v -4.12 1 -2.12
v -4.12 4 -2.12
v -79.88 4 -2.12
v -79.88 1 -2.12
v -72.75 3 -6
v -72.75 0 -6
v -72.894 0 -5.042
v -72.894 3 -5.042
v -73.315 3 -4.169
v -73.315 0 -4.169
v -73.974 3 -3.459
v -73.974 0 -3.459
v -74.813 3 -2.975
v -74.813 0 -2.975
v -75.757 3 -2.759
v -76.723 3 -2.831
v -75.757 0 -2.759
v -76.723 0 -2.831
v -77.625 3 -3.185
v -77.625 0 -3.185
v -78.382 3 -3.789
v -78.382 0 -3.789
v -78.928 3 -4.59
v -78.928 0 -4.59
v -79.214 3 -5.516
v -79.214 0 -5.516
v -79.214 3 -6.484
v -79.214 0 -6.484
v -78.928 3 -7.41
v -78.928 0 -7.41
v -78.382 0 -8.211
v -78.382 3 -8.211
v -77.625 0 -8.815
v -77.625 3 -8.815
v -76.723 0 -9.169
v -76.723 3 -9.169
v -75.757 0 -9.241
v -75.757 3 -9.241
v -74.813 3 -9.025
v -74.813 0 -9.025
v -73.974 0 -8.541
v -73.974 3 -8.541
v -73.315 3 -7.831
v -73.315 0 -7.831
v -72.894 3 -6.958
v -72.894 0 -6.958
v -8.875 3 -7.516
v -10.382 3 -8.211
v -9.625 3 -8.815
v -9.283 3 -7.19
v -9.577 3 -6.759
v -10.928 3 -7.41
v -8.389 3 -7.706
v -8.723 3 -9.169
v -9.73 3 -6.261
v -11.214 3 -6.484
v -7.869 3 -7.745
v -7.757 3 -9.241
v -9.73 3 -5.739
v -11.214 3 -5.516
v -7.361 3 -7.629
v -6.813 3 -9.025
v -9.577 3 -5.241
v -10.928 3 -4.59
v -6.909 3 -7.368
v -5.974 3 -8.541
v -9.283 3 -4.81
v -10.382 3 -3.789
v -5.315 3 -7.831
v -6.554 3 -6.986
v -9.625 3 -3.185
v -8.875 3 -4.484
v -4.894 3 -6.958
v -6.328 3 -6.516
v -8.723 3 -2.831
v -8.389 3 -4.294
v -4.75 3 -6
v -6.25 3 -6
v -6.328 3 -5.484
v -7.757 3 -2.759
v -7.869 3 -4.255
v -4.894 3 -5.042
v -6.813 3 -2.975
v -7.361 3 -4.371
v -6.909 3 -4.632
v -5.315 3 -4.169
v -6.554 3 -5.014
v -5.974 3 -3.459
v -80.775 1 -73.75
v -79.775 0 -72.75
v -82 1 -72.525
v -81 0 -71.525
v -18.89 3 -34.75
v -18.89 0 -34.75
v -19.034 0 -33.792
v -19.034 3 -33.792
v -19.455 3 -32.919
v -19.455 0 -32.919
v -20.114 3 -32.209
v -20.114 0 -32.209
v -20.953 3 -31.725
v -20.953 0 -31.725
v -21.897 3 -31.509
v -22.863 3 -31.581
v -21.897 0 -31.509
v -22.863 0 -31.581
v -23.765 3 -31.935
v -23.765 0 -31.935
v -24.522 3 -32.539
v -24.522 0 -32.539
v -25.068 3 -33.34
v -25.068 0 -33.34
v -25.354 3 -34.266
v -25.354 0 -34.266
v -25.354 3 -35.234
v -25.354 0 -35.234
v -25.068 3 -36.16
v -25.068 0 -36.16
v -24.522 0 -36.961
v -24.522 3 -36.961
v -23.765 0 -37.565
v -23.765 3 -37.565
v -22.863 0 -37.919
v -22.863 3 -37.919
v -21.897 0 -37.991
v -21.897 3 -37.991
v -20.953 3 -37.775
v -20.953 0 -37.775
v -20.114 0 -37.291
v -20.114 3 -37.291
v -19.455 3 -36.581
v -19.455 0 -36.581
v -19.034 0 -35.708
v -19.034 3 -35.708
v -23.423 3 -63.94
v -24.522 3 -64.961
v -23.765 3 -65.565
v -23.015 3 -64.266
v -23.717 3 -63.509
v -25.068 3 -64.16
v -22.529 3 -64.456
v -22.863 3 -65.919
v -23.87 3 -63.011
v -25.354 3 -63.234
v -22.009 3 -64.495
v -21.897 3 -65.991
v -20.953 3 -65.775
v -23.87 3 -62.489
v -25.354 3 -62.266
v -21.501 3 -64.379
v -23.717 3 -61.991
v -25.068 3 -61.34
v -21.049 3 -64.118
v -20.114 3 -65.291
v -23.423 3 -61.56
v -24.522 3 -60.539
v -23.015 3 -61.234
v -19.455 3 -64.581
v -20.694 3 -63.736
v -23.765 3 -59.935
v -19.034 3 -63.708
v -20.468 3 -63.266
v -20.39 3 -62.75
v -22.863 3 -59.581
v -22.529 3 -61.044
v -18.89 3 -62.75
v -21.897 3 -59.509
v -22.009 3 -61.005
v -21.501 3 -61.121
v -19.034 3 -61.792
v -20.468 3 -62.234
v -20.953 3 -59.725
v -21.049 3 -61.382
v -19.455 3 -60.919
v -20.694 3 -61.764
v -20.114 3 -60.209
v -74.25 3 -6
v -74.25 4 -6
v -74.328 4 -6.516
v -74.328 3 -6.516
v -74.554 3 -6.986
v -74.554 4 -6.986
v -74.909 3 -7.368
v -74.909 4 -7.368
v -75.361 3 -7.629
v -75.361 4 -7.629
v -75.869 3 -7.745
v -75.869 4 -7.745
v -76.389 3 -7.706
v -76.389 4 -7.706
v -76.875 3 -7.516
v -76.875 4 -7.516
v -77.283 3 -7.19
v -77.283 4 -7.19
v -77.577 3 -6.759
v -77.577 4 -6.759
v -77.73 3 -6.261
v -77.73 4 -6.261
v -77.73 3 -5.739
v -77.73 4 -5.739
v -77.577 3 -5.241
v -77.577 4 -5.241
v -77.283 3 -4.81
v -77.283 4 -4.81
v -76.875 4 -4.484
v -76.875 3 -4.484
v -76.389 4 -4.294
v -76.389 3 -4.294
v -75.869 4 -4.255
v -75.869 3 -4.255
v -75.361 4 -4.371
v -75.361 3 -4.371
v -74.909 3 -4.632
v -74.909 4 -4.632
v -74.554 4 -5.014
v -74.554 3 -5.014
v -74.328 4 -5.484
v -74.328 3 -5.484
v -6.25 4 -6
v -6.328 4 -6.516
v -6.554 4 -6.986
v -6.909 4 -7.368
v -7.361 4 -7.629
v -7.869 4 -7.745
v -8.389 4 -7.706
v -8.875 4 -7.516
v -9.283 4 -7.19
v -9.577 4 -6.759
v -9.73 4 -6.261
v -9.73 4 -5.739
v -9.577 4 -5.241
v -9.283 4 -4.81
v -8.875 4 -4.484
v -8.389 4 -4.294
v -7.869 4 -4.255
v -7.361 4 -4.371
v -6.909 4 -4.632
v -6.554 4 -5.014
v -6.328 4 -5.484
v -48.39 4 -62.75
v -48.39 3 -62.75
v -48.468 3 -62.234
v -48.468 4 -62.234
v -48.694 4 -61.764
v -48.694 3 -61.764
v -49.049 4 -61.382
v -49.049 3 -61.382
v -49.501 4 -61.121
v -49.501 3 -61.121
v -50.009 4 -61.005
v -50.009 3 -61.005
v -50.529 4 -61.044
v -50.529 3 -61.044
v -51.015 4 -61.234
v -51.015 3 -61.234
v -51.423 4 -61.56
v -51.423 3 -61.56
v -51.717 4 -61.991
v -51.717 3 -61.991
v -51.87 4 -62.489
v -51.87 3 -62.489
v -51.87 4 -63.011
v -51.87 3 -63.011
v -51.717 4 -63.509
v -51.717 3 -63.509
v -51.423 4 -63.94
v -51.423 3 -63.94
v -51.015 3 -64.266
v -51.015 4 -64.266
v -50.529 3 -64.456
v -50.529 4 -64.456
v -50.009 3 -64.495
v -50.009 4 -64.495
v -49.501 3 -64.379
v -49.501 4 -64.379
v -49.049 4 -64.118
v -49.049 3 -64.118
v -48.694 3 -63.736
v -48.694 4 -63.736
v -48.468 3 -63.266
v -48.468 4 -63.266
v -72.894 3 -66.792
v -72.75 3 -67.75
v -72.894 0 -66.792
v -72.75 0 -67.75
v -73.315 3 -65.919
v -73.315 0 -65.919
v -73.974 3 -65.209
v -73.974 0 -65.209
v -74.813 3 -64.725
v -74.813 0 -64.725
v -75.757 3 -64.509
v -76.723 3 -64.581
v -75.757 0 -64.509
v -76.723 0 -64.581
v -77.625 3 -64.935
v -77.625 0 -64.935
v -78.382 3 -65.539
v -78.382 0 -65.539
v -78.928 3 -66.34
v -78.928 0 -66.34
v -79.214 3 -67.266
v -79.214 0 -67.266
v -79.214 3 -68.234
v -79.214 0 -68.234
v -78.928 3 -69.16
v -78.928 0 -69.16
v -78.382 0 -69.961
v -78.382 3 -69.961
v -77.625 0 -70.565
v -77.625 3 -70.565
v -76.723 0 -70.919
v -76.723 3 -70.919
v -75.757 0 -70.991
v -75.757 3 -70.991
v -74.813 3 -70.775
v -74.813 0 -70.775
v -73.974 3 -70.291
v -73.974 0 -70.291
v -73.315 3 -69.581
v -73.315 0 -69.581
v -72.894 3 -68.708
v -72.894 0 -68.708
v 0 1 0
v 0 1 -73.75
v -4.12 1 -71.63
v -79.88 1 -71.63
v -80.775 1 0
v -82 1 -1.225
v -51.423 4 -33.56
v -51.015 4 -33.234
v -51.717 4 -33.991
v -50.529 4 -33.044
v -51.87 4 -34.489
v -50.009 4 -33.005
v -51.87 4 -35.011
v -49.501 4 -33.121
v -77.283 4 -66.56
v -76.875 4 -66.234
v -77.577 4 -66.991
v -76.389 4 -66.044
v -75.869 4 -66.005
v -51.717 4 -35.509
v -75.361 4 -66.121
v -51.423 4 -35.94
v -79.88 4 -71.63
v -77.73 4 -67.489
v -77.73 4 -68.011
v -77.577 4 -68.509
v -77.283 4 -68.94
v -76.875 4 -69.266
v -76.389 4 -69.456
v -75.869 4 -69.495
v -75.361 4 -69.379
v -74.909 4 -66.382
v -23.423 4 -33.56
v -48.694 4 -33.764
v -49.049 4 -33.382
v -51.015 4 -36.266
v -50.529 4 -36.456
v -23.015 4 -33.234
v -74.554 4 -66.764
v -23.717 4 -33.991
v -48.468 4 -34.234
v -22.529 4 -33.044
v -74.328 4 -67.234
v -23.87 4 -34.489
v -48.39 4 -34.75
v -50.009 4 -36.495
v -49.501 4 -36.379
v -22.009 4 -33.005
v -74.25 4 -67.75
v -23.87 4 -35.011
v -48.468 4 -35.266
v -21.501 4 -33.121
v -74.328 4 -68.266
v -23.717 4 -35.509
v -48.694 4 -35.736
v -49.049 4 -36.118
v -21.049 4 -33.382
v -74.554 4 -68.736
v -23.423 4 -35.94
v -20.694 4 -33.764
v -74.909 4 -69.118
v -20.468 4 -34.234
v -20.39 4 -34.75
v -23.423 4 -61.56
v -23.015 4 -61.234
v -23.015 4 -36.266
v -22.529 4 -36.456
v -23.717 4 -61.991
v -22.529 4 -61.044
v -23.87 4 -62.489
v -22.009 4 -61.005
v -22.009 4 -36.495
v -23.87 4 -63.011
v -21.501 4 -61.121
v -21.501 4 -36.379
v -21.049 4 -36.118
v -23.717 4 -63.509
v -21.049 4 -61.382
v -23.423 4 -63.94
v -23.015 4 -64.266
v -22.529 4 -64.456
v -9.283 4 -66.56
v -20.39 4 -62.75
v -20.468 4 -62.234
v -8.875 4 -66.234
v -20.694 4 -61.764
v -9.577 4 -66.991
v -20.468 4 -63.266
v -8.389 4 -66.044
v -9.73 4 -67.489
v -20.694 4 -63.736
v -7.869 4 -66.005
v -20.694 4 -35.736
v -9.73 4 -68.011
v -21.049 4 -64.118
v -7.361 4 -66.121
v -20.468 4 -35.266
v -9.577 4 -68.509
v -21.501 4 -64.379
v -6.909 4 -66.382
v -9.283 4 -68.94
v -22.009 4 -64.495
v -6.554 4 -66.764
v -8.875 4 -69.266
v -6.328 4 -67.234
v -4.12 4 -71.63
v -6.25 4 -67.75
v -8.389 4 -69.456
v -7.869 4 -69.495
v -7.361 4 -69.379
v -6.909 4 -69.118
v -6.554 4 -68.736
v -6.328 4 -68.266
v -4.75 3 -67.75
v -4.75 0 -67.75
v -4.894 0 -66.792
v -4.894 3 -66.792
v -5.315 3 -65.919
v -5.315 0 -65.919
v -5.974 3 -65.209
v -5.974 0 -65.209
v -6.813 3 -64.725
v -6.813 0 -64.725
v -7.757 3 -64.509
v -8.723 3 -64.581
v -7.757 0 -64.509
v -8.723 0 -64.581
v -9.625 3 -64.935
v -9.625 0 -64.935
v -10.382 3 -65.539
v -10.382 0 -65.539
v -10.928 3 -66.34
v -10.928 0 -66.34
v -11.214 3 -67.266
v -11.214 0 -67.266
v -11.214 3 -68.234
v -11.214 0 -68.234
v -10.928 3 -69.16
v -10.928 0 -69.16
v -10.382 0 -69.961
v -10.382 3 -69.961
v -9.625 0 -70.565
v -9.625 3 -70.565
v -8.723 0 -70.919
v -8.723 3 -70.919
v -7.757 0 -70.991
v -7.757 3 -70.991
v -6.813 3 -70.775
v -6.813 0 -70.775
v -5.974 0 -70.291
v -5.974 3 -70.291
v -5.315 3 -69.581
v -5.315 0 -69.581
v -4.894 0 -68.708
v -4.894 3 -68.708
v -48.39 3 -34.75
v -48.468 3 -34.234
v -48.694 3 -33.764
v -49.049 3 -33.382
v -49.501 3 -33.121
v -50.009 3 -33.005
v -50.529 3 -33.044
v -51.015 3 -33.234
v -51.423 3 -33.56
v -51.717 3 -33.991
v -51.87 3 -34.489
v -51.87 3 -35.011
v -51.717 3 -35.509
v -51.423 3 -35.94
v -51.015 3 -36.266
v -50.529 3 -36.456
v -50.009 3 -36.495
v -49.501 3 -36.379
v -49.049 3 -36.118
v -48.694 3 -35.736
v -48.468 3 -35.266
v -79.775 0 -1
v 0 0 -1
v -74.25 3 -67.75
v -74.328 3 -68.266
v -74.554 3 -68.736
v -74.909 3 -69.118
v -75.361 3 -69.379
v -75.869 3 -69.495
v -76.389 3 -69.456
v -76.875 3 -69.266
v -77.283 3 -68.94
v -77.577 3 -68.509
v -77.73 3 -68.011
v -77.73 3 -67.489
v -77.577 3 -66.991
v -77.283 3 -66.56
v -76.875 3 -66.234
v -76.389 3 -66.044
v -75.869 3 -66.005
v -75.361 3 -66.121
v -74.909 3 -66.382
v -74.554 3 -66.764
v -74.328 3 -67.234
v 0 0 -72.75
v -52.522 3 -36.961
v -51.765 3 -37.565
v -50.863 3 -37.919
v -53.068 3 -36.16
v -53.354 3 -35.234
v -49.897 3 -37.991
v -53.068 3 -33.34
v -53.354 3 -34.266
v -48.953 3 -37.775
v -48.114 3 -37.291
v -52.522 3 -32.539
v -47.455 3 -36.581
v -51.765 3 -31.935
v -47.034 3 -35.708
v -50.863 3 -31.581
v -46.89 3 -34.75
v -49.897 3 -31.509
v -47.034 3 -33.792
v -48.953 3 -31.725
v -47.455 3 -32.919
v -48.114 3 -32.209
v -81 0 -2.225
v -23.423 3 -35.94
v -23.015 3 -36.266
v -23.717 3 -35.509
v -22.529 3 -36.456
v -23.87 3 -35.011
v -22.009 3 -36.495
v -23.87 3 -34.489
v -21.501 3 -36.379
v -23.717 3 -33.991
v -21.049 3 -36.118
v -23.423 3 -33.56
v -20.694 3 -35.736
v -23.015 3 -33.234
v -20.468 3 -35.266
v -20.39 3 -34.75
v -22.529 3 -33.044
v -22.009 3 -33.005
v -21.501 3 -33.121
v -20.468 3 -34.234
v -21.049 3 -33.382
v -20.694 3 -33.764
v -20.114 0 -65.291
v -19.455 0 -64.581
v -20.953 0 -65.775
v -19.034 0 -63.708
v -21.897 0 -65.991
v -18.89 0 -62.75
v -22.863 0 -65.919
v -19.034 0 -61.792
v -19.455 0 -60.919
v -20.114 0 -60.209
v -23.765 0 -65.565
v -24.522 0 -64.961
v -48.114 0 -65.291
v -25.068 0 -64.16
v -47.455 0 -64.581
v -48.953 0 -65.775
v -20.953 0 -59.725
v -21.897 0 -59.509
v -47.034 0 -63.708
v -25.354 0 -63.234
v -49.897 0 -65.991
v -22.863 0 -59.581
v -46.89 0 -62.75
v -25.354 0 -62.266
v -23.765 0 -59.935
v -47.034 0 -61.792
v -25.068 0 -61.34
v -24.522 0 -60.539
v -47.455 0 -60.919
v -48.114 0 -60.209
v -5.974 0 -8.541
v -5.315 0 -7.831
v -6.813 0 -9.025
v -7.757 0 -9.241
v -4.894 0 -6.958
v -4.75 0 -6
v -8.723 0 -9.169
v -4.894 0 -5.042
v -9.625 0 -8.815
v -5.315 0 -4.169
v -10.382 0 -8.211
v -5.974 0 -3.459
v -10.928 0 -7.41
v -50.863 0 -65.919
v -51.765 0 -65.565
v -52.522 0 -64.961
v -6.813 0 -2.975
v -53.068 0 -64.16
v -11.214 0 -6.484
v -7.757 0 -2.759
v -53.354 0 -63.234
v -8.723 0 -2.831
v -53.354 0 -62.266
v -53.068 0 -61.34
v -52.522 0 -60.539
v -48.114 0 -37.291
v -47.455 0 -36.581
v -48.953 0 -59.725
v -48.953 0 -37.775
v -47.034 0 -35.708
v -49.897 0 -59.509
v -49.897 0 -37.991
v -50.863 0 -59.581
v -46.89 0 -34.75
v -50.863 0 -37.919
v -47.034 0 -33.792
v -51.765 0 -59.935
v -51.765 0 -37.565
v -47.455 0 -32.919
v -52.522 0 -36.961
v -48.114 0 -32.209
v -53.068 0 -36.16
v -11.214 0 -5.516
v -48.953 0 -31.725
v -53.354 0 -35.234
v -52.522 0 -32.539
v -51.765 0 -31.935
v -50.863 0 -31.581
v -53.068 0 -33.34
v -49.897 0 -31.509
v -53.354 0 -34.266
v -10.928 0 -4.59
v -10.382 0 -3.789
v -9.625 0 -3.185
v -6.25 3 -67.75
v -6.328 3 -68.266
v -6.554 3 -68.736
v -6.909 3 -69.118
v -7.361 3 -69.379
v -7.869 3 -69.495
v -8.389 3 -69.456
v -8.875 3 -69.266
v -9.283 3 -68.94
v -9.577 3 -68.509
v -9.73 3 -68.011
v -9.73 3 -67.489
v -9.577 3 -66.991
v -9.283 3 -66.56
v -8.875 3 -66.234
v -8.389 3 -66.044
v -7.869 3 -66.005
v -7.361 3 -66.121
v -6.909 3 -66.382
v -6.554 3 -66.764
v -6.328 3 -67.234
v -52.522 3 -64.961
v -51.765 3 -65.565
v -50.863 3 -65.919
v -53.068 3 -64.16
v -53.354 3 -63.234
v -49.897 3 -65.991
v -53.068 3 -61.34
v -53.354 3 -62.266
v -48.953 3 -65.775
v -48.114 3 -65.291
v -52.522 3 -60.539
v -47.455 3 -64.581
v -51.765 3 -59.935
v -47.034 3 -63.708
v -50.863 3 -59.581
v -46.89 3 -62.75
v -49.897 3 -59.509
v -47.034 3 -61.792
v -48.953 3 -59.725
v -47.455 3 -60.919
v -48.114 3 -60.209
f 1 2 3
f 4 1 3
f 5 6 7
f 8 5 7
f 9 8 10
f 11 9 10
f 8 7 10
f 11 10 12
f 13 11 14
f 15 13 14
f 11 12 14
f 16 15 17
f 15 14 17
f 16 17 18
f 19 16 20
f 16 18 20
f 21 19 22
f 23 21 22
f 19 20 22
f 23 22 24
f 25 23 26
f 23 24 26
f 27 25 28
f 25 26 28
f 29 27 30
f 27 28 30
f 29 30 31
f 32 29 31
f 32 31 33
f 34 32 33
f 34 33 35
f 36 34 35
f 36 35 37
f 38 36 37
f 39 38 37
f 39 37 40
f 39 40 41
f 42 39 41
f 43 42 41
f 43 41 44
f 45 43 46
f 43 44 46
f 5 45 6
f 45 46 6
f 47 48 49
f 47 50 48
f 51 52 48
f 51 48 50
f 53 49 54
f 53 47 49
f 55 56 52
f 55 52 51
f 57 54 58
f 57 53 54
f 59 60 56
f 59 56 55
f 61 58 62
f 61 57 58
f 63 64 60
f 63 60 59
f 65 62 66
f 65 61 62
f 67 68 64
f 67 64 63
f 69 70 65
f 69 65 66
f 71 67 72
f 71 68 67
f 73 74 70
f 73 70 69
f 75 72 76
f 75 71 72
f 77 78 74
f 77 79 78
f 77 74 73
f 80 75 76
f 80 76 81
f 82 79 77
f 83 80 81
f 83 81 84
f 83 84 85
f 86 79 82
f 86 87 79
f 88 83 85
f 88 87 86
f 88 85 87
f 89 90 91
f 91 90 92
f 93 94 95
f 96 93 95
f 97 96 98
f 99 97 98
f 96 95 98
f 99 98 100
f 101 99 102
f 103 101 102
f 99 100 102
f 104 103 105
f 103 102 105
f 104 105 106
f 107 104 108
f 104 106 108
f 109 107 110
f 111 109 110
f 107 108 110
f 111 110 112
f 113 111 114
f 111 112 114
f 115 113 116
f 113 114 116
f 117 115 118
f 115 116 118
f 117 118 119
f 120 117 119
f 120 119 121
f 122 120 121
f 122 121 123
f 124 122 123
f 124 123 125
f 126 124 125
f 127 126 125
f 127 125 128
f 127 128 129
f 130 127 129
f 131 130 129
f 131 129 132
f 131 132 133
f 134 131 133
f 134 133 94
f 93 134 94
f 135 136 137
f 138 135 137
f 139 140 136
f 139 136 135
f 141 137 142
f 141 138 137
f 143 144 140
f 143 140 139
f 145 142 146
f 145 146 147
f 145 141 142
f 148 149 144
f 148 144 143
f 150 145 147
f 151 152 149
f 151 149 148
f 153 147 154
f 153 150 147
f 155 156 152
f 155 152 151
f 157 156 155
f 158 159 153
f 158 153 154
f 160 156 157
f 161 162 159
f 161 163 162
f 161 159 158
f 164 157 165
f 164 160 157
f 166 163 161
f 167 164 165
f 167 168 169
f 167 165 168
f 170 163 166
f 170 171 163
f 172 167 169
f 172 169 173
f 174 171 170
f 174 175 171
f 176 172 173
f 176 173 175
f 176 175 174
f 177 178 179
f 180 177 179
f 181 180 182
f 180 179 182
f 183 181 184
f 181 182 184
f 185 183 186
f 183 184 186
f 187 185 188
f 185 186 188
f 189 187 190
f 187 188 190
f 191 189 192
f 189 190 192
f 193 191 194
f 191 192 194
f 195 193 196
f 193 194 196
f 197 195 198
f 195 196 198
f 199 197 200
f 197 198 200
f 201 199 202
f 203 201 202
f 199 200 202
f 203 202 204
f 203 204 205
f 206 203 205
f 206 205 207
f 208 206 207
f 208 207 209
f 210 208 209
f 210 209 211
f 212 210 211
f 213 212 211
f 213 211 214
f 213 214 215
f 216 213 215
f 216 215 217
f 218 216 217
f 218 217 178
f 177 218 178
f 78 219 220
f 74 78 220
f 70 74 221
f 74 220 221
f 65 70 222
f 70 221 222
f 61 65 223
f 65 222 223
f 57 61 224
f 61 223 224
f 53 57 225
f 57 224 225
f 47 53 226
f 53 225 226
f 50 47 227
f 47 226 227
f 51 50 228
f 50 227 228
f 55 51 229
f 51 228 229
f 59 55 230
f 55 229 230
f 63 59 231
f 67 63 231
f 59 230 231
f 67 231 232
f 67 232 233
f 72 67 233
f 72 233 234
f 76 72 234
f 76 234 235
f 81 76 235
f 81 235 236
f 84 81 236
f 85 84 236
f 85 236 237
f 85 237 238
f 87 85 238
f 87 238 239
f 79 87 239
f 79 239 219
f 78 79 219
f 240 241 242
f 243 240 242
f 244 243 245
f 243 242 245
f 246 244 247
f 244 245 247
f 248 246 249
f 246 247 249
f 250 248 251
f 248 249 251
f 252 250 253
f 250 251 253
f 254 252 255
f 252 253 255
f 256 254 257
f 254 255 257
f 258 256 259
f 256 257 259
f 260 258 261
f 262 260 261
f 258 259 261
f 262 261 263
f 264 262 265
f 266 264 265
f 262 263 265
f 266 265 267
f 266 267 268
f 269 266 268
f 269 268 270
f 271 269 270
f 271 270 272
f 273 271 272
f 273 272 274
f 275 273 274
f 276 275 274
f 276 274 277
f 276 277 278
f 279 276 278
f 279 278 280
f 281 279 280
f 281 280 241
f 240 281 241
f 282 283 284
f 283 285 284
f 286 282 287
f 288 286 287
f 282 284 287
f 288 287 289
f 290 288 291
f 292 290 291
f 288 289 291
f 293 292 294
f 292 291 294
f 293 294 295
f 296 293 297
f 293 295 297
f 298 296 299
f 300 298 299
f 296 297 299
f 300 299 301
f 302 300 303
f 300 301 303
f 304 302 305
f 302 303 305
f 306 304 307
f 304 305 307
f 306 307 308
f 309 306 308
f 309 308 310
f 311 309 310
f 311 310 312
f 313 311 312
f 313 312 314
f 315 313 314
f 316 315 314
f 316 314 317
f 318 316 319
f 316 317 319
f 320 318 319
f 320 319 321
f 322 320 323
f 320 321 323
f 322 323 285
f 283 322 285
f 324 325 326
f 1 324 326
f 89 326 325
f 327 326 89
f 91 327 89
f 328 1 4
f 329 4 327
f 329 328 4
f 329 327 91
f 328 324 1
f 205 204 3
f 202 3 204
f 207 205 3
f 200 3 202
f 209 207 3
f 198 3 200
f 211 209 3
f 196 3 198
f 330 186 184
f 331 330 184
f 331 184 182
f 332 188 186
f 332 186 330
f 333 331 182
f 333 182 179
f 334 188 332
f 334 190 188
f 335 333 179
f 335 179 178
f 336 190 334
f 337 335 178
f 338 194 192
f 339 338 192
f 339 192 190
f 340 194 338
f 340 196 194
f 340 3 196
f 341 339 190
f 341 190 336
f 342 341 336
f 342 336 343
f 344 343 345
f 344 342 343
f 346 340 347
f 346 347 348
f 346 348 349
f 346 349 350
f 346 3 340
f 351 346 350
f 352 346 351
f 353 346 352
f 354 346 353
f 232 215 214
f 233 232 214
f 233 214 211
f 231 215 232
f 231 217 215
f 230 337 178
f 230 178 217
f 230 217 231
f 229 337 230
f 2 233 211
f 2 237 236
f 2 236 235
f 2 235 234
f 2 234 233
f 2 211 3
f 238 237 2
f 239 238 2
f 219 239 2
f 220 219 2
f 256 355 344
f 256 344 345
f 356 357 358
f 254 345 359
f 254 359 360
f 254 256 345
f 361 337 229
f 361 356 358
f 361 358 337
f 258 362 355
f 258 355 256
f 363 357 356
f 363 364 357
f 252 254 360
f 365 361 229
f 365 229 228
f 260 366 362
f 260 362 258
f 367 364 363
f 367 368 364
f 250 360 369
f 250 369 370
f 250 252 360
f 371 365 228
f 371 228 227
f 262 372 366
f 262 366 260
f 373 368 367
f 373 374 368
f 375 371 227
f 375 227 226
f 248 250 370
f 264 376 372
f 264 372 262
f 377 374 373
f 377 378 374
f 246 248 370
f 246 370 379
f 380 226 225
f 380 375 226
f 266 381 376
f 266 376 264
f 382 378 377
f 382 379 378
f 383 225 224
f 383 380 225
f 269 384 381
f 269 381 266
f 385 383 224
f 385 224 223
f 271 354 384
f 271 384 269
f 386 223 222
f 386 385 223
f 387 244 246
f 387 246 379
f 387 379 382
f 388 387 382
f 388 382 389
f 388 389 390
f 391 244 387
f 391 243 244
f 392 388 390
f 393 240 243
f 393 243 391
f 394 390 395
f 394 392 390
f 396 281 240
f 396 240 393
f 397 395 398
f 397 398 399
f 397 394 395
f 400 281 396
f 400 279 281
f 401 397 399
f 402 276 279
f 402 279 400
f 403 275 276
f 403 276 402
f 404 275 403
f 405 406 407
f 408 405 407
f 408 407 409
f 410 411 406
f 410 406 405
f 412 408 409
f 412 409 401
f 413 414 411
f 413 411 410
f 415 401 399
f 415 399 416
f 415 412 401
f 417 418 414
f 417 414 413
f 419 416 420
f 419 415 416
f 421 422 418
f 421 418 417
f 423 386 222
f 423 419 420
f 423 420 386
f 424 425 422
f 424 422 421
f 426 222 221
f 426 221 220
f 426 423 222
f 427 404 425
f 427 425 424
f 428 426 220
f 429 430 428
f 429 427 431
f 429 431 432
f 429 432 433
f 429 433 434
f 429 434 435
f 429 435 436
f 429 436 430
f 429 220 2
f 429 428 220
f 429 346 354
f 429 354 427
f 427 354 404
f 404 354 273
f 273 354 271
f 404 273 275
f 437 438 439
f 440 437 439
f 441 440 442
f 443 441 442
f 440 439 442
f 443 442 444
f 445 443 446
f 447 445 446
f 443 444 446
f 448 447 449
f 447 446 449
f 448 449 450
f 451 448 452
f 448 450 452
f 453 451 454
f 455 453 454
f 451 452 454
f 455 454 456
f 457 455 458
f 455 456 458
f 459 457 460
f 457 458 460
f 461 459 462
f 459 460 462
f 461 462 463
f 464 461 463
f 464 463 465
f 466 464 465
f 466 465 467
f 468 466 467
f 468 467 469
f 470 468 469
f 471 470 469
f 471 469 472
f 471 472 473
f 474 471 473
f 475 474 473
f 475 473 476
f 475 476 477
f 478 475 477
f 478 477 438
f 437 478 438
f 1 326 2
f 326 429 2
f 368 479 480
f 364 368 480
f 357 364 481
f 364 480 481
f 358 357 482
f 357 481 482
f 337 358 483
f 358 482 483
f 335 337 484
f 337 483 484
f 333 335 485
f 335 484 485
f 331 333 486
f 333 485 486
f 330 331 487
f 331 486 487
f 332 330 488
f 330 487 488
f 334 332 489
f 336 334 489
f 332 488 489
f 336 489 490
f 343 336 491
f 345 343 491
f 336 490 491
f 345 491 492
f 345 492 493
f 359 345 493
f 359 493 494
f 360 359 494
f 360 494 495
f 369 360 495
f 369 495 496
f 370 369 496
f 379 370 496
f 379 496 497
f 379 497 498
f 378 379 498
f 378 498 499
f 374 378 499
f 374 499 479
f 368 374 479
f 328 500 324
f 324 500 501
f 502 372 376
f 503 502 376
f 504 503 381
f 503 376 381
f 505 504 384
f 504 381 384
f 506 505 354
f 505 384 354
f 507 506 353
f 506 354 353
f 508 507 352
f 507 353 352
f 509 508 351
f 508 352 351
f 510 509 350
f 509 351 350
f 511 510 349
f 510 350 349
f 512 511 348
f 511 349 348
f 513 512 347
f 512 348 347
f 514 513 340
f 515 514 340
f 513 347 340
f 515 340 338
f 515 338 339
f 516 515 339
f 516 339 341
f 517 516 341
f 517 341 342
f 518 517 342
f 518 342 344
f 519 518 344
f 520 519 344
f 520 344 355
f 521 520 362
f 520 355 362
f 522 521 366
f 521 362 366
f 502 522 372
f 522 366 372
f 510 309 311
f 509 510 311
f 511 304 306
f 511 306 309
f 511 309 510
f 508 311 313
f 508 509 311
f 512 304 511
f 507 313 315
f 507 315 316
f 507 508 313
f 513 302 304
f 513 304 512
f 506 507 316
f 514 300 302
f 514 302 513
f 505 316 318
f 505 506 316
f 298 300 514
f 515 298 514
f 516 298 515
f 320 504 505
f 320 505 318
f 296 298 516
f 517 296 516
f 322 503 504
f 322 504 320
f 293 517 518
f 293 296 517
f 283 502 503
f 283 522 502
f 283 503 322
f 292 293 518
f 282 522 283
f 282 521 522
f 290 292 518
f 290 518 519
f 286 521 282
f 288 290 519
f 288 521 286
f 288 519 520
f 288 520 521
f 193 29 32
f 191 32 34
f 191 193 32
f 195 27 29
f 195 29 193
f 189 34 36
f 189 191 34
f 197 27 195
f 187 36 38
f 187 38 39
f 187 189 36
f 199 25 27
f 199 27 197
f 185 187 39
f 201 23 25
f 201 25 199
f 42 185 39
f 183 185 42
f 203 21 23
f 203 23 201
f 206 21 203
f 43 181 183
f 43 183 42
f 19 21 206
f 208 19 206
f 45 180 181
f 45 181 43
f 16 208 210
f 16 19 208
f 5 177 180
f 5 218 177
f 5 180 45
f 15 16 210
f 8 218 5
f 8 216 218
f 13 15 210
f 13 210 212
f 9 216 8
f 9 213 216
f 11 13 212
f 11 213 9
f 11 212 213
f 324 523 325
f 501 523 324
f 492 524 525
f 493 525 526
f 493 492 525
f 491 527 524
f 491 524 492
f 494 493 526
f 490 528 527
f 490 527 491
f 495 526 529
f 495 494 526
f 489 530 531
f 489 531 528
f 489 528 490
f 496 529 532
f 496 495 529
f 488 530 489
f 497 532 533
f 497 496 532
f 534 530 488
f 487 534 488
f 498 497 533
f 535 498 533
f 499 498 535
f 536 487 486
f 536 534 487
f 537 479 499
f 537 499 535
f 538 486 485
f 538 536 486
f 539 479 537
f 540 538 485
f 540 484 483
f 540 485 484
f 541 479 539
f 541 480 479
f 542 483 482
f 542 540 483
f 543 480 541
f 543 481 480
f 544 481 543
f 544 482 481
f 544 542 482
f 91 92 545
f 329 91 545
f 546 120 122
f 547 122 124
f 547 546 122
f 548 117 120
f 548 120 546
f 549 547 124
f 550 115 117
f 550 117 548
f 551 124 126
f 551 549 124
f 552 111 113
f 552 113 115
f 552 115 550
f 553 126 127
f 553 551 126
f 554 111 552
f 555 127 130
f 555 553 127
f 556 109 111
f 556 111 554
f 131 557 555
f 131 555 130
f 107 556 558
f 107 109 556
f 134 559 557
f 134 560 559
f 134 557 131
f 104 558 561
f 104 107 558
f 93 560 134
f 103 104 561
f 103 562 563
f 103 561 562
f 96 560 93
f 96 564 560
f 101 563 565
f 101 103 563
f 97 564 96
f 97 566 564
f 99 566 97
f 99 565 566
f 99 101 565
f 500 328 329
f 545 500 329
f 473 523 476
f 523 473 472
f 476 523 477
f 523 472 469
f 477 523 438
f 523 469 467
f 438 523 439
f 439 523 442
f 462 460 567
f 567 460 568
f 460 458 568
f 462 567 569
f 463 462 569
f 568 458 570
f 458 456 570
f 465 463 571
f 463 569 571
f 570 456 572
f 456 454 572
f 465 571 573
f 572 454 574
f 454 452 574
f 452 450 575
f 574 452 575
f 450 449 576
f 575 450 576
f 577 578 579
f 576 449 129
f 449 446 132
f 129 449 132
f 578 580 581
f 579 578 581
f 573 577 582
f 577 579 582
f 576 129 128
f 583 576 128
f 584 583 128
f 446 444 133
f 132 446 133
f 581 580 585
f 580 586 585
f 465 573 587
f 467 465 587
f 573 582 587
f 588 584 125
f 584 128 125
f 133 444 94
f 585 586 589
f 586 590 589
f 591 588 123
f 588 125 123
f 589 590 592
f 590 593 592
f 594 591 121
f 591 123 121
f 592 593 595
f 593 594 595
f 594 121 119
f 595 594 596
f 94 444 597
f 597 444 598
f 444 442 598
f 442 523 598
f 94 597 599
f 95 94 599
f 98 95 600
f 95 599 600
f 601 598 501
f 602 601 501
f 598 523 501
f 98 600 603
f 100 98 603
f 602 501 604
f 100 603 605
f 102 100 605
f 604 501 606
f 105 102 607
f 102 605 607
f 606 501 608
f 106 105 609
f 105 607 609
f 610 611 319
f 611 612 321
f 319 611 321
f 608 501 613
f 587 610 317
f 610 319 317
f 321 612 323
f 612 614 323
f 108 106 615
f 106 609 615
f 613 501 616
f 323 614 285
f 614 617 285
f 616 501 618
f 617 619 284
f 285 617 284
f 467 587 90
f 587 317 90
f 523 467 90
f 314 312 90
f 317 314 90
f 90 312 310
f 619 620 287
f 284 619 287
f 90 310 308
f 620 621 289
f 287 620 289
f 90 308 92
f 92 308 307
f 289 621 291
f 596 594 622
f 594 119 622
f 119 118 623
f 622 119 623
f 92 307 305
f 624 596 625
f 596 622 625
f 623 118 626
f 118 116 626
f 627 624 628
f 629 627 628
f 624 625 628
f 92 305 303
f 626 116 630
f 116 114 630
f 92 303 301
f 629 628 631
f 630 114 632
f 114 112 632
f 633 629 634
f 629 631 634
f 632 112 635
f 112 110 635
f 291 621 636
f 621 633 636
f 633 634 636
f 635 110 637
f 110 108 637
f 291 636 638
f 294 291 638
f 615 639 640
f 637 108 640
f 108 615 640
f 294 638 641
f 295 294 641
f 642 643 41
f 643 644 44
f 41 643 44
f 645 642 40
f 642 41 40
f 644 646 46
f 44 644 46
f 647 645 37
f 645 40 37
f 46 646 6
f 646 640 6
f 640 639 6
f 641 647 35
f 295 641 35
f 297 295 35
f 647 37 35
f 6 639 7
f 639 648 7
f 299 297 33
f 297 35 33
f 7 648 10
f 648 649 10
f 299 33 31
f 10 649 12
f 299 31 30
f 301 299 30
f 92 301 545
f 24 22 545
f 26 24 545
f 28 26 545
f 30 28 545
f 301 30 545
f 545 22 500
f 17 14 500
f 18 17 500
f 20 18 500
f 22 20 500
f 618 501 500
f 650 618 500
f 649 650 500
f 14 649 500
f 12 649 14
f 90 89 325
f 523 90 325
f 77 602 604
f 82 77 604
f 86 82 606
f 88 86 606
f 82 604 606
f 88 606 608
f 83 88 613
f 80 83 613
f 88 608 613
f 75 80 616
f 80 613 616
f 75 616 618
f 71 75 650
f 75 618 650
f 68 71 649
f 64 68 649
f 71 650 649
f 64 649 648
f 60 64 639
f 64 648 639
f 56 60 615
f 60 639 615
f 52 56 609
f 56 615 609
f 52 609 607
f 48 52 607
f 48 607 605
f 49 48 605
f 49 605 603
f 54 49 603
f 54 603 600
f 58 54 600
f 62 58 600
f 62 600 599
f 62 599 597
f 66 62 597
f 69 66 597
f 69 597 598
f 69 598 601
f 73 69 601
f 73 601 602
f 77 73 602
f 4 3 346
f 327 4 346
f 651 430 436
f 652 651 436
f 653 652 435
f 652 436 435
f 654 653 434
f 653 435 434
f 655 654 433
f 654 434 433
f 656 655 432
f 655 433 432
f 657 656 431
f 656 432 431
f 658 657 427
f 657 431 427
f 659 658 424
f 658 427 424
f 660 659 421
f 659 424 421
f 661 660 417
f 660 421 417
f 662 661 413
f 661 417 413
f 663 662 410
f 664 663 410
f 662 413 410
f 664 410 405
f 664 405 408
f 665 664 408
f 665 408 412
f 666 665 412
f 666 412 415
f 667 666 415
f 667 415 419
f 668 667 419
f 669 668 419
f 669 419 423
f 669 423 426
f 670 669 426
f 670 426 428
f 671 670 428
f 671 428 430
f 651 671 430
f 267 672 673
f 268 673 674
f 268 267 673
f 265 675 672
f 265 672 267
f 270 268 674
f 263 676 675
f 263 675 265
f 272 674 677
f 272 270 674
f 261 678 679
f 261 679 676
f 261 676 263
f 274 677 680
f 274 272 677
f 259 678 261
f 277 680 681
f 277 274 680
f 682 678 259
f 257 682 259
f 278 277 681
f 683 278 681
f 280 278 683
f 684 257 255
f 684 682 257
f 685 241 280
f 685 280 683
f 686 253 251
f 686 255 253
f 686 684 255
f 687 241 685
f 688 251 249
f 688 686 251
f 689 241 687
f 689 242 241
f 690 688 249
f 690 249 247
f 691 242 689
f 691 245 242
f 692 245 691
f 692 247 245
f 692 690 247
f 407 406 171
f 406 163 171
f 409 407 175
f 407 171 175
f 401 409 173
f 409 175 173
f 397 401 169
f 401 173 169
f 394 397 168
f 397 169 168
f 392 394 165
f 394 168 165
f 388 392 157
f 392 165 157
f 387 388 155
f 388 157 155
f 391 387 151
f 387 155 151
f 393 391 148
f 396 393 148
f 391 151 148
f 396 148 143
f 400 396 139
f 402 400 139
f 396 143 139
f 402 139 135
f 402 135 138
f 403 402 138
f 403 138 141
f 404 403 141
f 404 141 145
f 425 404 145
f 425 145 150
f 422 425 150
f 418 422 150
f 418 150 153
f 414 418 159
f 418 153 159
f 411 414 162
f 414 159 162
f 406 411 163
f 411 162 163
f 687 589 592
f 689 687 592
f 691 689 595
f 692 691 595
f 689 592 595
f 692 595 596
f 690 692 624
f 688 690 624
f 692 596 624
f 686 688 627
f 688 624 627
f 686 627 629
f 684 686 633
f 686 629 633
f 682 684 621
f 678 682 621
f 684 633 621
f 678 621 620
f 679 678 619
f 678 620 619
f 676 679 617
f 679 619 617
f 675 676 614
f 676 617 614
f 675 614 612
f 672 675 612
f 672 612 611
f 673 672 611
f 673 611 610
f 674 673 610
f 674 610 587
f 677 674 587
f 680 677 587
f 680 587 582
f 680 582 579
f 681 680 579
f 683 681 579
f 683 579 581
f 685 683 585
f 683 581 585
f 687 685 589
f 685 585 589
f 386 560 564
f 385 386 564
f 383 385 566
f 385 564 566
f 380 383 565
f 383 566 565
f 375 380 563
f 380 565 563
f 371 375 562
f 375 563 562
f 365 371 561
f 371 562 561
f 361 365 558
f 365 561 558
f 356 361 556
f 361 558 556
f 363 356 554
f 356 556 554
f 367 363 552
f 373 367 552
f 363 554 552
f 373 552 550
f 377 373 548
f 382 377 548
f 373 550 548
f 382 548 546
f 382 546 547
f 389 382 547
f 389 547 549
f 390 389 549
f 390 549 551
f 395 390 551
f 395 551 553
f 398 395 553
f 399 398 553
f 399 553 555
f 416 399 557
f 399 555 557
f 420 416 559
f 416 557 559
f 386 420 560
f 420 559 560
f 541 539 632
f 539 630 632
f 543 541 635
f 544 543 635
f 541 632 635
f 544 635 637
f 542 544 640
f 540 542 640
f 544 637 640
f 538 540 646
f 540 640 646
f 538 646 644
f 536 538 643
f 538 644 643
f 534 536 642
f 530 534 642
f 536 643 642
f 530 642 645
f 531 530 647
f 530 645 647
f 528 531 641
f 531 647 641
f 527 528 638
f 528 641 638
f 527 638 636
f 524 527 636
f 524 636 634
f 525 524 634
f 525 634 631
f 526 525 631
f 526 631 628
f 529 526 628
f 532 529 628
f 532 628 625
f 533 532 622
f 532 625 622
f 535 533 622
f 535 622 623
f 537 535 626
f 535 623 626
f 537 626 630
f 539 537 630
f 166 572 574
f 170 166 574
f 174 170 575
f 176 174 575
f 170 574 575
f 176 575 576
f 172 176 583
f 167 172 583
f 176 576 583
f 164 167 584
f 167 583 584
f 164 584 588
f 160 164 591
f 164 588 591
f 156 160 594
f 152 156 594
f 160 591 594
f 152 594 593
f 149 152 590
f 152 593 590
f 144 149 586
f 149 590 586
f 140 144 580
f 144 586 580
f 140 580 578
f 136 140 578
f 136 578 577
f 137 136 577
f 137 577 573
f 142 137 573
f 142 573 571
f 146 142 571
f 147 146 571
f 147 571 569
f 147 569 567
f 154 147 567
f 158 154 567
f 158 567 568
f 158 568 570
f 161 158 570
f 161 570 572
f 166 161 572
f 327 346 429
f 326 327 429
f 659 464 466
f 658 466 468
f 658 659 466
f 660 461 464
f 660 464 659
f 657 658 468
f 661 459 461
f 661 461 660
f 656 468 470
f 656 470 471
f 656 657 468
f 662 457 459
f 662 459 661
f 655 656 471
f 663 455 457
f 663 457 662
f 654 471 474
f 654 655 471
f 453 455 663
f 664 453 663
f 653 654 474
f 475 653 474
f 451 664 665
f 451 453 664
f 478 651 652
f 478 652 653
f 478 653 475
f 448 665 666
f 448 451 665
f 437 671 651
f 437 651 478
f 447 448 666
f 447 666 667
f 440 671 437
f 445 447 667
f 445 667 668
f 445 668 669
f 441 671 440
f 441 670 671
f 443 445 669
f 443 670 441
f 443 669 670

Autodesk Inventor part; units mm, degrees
ref_plane "YZ Plane" through (0, 0, 0) normal (1, 0, 0) x (0, 1, 0)
ref_plane "XZ Plane" through (0, 0, 0) normal (0, 1, 0) x (-1, 0, 0)
ref_plane "XY Plane" through (0, 0, 0) normal (0, 0, 1) x (1, 0, 0)
sketch "Sketch1" plane through (0, 0, 0) normal (0, 1, 0) x (-1, 0, 0)
  line L0 (0, 0) -> (82, 0)
  line L1 (82, 0) -> (82, -73.75)
  line L2 (82, -73.75) -> (0, -73.75)
  line L3 (0, -73.75) -> (0, 0)
  dimension "d0" = 82
  dimension "d1" = 73.75
extrude "Extrusion1" add sketch "Sketch1" along normal blind 1
sketch "Sketch2" plane through (0, 1, 0) normal (0, 1, 0) x (1, 0, 0)
  line L0 (-82, 0) -> (0, 0) projected
  line L1 (0, 0) -> (-4, 0)
  line L2 (-4, 0) -> (-4, 2)
  line L3 (-4, 2) -> (0, 2)
  line L4 (0, 2) -> (0, 0)
  line L5 (0, 73.75) -> (-82, 73.75) projected
  line L6 (0, 73.75) -> (-4, 73.75)
  line L7 (-4, 73.75) -> (-4, 71.75)
  line L8 (-4, 71.75) -> (0, 71.75)
  line L9 (0, 71.75) -> (0, 73.75)
  line L10 (0, 73.75) -> (-82, 73.75)
  line L11 (-82, 0) -> (-80, 0)
  line L12 (-80, 0) -> (-80, 2)
  line L13 (-80, 2) -> (-82, 2)
  line L14 (-82, 2) -> (-82, 0)
  line L15 (-82, 73.75) -> (-82, 0) projected
  line L16 (-82, 73.75) -> (-80, 73.75)
  line L17 (-80, 73.75) -> (-80, 71.75)
  line L18 (-80, 71.75) -> (-82, 71.75)
  line L19 (-82, 71.75) -> (-82, 73.75)
  line L20 (-4, 2) -> (-80, 2)
  line L21 (-80, 2) -> (-80, 71.75)
  line L22 (-80, 71.75) -> (-4, 71.75)
  line L23 (-4, 71.75) -> (-4, 2)
  dimension "d4" = 4
  dimension "d5" = 2
  dimension "d6" = 4
  dimension "d7" = 2
  dimension "d8" = 2
  dimension "d9" = 2
  dimension "d10" = 2
  dimension "d11" = 2
extrude "Extrusion2" add sketch "Sketch2" along normal blind 3 contours L21 L22 L23 L20
sketch "Sketch3" plane through (0, 0, 0) normal (0, -1, 0) x (1, 0, 0)
  line L0 (-82, -73.75) -> (-82, 0) projected
  line L1 (-82, -73.75) -> (-50.14, -73.75)
  line L2 (-50.14, -73.75) -> (-50.14, -62.75)
  line L3 (-50.14, -62.75) -> (-82, -62.75)
  line L4 (-82, -62.75) -> (-82, -73.75)
  line L5 (-50.14, -62.75) -> (-22.14, -62.75)
  line L6 (-22.14, -62.75) -> (-22.14, -34.75)
  line L7 (-22.14, -34.75) -> (-50.14, -34.75)
  line L8 (-50.14, -34.75) -> (-50.14, -62.75)
  circle A0 centre (-22.14, -62.75) radius 1.75
  circle A1 centre (-22.14, -34.75) radius 1.75
  circle A2 centre (-50.14, -34.75) radius 1.75
  circle A3 centre (-50.14, -62.75) radius 1.75
  point P0 (0, 0)
  point P1 (-48.39, -62.75)
  point P2 (-50.14, -61)
  point P3 (-51.89, -62.75)
  point P4 (-50.14, -64.5)
  point P5 (-23.89, -62.75)
  point P6 (-22.14, -61)
  point P7 (-22.14, -36.5)
  point P8 (-23.89, -34.75)
  point P9 (-48.39, -34.75)
  point P10 (-50.14, -36.5)
  dimension "d14" = 31.86
  dimension "d15" = 11
  dimension "d16" = 28
  dimension "d17" = 28
  dimension "d18" = 3.5
  dimension "d19" = 3.5
  dimension "d20" = 3.5
  dimension "d21" = 3.5
extrude "Extrusion3" cut sketch "Sketch3" against normal blind 5 contours A3 L8 L3 | L3 L2 A3 | L2 L5 A3 | L8 A3 L5 | A2 L7 L8 | L8 L7 A2 | A0 L6 L5 | L5 L6 A0 | A1 L6 L7 | L7 L6 A1
sketch "Sketch4" plane through (0, 0, 0) normal (0, -1, 0) x (1, 0, 0)
  circle A0 centre (-22.14, -62.75) radius 1.75 projected
  circle A1 centre (-22.14, -62.75) radius 3.25
  circle A2 centre (-50.14, -62.75) radius 1.75 projected
  circle A3 centre (-50.14, -62.75) radius 3.25
  circle A4 centre (-50.14, -34.75) radius 1.75 projected
  circle A5 centre (-50.14, -34.75) radius 3.25
  circle A6 centre (-22.14, -34.75) radius 1.75 projected
  circle A7 centre (-22.14, -34.75) radius 3.25
  point P0 (0, 0)
  dimension "d24" = 6.5
  dimension "d25" = 6.5
  dimension "d26" = 6.5
  dimension "d27" = 6.5
extrude "Extrusion4" cut sketch "Sketch4" against normal blind 3
sketch "Sketch5" plane through (0, 4, 0) normal (0, 1, 0) x (1, 0, 0)
  line L0 (-4, 71.75) -> (-80, 71.75) projected
  line L1 (-80, 71.75) -> (-76, 71.75)
  line L2 (-80, 71.75) -> (-76, 71.75)
  line L3 (-76, 71.75) -> (-76, 67.75)
  line L4 (-76, 67.75) -> (-80, 67.75)
  line L5 (-80, 67.75) -> (-80, 71.75)
  line L6 (-4, 71.75) -> (-8, 71.75)
  line L7 (-8, 71.75) -> (-8, 67.75)
  line L8 (-8, 67.75) -> (-4, 67.75)
  line L9 (-4, 67.75) -> (-4, 71.75)
  line L10 (-80, 2) -> (-4, 2) projected
  line L11 (-4, 2) -> (-8, 2)
  line L12 (-8, 2) -> (-8, 6)
  line L13 (-8, 6) -> (-4, 6)
  line L14 (-4, 6) -> (-4, 2)
  line L15 (-80, 2) -> (-76, 2)
  line L16 (-76, 2) -> (-76, 6)
  line L17 (-76, 6) -> (-80, 6)
  line L18 (-80, 6) -> (-80, 2)
  circle A0 centre (-76, 67.75) radius 1.75
  circle A1 centre (-8, 67.75) radius 1.75
  circle A2 centre (-8, 6) radius 1.75
  circle A3 centre (-76, 6) radius 1.75
  point P0 (0, 0)
  dimension "d30" = 4
  dimension "d31" = 4
  dimension "d32" = 4
  dimension "d33" = 4
  dimension "d34" = 4
  dimension "d35" = 4
  dimension "d36" = 4
  dimension "d37" = 4
  dimension "d38" = 4
  dimension "d39" = 3.5
  dimension "d40" = 3.5
  dimension "d41" = 3.5
  dimension "d42" = 3.5
extrude "Extrusion5" cut sketch "Sketch5" against normal blind 5 contours A1 L8 L7 | L7 L8 A1 | A0 L4 L3 | L3 L4 A0 | A3 L17 L16 | L16 L17 A3 | A2 L13 L12 | L12 L13 A2
sketch "Sketch6" plane through (0, 0, 0) normal (0, -1, 0) x (1, 0, 0)
  circle A0 centre (-8, -67.75) radius 1.75 projected
  circle A1 centre (-8, -67.75) radius 3.25
  circle A2 centre (-76, -67.75) radius 1.75 projected
  circle A3 centre (-76, -67.75) radius 3.25
  circle A4 centre (-76, -6) radius 1.75 projected
  circle A5 centre (-76, -6) radius 3.25
  circle A6 centre (-8, -6) radius 1.75 projected
  circle A7 centre (-8, -6) radius 3.25
  point P0 (0, 0)
  dimension "d45" = 6.5
  dimension "d46" = 6.5
  dimension "d47" = 6.5
  dimension "d48" = 6.5
extrude "Extrusion6" cut sketch "Sketch6" against normal blind 3 contours A0 | A1 | A2 | A3 | A4 | A5 | A6 | A7
sketch "Sketch7" plane through (0, 4, 0) normal (0, 1, 0) x (1, 0, 0)
  line L0 (-4, 2) -> (-4, 71.75) projected
  line L1 (-4, 2) -> (-4.12, 2)
  line L2 (-4.12, 2) -> (-4.12, 2.12)
  line L3 (-4.12, 2.12) -> (-4, 2.12)
  line L4 (-4, 2.12) -> (-4, 2)
  line L5 (-80, 71.75) -> (-4, 71.75) projected
  line L6 (-80, 71.75) -> (-79.88, 71.75)
  line L7 (-79.88, 71.75) -> (-79.88, 71.63)
  line L8 (-79.88, 71.63) -> (-80, 71.63)
  line L9 (-80, 71.63) -> (-80, 71.75)
  line L10 (-79.88, 71.63) -> (-4, 71.63)
  line L11 (-4, 71.63) -> (-4, 71.75)
  line L12 (-4, 71.75) -> (-79.88, 71.75)
  line L13 (-79.88, 71.75) -> (-79.88, 71.63)
  line L14 (-4.12, 2) -> (-4, 2)
  line L15 (-4, 2) -> (-4, 71.75)
  line L16 (-4, 71.75) -> (-4.12, 71.75)
  line L17 (-4.12, 71.75) -> (-4.12, 2)
  line L18 (-80, 2) -> (-4, 2) projected
  line L19 (-4.12, 2.12) -> (-80, 2.12)
  line L20 (-80, 2.12) -> (-80, 2)
  line L21 (-80, 2) -> (-4.12, 2)
  line L22 (-4.12, 2) -> (-4.12, 2.12)
  line L23 (-80, 2) -> (-79.88, 2)
  line L24 (-79.88, 2) -> (-79.88, 71.63)
  line L25 (-79.88, 71.63) -> (-80, 71.63)
  line L26 (-80, 71.63) -> (-80, 2)
  point P0 (0, 0)
  point P1 (-4.12, 2.12)
  point P2 (-79.88, 2.12)
  point P3 (-4.12, 71.63)
  dimension "d51" = 0.12
  dimension "d52" = 0.12
  dimension "d53" = 0.12
  dimension "d54" = 0.12
extrude "Extrusion7" cut sketch "Sketch7" against normal blind 3 contours L1 L2 L3 L0 | L3 L17 L10 L0 | L18 L24 L19 L2 | L10 L17 L5 L0 | L18 L20 L19 L24 | L10 L7 L5 L17 | L19 L26 L8 L24 | L8 L9 L5 L7
chamfer "Chamfer1" distance 1 angle 45 3 edges at (-41, 0, -73.75) (-82, 0, -36.875) (-41, 0, 0)
chamfer "Chamfer2" distance 1 angle 45 2 edges at (-81.5001, 0.4999, -73.2501) (-81.5001, 0.4999, -0.4999)
properties part number "Electronics Box Lid"
